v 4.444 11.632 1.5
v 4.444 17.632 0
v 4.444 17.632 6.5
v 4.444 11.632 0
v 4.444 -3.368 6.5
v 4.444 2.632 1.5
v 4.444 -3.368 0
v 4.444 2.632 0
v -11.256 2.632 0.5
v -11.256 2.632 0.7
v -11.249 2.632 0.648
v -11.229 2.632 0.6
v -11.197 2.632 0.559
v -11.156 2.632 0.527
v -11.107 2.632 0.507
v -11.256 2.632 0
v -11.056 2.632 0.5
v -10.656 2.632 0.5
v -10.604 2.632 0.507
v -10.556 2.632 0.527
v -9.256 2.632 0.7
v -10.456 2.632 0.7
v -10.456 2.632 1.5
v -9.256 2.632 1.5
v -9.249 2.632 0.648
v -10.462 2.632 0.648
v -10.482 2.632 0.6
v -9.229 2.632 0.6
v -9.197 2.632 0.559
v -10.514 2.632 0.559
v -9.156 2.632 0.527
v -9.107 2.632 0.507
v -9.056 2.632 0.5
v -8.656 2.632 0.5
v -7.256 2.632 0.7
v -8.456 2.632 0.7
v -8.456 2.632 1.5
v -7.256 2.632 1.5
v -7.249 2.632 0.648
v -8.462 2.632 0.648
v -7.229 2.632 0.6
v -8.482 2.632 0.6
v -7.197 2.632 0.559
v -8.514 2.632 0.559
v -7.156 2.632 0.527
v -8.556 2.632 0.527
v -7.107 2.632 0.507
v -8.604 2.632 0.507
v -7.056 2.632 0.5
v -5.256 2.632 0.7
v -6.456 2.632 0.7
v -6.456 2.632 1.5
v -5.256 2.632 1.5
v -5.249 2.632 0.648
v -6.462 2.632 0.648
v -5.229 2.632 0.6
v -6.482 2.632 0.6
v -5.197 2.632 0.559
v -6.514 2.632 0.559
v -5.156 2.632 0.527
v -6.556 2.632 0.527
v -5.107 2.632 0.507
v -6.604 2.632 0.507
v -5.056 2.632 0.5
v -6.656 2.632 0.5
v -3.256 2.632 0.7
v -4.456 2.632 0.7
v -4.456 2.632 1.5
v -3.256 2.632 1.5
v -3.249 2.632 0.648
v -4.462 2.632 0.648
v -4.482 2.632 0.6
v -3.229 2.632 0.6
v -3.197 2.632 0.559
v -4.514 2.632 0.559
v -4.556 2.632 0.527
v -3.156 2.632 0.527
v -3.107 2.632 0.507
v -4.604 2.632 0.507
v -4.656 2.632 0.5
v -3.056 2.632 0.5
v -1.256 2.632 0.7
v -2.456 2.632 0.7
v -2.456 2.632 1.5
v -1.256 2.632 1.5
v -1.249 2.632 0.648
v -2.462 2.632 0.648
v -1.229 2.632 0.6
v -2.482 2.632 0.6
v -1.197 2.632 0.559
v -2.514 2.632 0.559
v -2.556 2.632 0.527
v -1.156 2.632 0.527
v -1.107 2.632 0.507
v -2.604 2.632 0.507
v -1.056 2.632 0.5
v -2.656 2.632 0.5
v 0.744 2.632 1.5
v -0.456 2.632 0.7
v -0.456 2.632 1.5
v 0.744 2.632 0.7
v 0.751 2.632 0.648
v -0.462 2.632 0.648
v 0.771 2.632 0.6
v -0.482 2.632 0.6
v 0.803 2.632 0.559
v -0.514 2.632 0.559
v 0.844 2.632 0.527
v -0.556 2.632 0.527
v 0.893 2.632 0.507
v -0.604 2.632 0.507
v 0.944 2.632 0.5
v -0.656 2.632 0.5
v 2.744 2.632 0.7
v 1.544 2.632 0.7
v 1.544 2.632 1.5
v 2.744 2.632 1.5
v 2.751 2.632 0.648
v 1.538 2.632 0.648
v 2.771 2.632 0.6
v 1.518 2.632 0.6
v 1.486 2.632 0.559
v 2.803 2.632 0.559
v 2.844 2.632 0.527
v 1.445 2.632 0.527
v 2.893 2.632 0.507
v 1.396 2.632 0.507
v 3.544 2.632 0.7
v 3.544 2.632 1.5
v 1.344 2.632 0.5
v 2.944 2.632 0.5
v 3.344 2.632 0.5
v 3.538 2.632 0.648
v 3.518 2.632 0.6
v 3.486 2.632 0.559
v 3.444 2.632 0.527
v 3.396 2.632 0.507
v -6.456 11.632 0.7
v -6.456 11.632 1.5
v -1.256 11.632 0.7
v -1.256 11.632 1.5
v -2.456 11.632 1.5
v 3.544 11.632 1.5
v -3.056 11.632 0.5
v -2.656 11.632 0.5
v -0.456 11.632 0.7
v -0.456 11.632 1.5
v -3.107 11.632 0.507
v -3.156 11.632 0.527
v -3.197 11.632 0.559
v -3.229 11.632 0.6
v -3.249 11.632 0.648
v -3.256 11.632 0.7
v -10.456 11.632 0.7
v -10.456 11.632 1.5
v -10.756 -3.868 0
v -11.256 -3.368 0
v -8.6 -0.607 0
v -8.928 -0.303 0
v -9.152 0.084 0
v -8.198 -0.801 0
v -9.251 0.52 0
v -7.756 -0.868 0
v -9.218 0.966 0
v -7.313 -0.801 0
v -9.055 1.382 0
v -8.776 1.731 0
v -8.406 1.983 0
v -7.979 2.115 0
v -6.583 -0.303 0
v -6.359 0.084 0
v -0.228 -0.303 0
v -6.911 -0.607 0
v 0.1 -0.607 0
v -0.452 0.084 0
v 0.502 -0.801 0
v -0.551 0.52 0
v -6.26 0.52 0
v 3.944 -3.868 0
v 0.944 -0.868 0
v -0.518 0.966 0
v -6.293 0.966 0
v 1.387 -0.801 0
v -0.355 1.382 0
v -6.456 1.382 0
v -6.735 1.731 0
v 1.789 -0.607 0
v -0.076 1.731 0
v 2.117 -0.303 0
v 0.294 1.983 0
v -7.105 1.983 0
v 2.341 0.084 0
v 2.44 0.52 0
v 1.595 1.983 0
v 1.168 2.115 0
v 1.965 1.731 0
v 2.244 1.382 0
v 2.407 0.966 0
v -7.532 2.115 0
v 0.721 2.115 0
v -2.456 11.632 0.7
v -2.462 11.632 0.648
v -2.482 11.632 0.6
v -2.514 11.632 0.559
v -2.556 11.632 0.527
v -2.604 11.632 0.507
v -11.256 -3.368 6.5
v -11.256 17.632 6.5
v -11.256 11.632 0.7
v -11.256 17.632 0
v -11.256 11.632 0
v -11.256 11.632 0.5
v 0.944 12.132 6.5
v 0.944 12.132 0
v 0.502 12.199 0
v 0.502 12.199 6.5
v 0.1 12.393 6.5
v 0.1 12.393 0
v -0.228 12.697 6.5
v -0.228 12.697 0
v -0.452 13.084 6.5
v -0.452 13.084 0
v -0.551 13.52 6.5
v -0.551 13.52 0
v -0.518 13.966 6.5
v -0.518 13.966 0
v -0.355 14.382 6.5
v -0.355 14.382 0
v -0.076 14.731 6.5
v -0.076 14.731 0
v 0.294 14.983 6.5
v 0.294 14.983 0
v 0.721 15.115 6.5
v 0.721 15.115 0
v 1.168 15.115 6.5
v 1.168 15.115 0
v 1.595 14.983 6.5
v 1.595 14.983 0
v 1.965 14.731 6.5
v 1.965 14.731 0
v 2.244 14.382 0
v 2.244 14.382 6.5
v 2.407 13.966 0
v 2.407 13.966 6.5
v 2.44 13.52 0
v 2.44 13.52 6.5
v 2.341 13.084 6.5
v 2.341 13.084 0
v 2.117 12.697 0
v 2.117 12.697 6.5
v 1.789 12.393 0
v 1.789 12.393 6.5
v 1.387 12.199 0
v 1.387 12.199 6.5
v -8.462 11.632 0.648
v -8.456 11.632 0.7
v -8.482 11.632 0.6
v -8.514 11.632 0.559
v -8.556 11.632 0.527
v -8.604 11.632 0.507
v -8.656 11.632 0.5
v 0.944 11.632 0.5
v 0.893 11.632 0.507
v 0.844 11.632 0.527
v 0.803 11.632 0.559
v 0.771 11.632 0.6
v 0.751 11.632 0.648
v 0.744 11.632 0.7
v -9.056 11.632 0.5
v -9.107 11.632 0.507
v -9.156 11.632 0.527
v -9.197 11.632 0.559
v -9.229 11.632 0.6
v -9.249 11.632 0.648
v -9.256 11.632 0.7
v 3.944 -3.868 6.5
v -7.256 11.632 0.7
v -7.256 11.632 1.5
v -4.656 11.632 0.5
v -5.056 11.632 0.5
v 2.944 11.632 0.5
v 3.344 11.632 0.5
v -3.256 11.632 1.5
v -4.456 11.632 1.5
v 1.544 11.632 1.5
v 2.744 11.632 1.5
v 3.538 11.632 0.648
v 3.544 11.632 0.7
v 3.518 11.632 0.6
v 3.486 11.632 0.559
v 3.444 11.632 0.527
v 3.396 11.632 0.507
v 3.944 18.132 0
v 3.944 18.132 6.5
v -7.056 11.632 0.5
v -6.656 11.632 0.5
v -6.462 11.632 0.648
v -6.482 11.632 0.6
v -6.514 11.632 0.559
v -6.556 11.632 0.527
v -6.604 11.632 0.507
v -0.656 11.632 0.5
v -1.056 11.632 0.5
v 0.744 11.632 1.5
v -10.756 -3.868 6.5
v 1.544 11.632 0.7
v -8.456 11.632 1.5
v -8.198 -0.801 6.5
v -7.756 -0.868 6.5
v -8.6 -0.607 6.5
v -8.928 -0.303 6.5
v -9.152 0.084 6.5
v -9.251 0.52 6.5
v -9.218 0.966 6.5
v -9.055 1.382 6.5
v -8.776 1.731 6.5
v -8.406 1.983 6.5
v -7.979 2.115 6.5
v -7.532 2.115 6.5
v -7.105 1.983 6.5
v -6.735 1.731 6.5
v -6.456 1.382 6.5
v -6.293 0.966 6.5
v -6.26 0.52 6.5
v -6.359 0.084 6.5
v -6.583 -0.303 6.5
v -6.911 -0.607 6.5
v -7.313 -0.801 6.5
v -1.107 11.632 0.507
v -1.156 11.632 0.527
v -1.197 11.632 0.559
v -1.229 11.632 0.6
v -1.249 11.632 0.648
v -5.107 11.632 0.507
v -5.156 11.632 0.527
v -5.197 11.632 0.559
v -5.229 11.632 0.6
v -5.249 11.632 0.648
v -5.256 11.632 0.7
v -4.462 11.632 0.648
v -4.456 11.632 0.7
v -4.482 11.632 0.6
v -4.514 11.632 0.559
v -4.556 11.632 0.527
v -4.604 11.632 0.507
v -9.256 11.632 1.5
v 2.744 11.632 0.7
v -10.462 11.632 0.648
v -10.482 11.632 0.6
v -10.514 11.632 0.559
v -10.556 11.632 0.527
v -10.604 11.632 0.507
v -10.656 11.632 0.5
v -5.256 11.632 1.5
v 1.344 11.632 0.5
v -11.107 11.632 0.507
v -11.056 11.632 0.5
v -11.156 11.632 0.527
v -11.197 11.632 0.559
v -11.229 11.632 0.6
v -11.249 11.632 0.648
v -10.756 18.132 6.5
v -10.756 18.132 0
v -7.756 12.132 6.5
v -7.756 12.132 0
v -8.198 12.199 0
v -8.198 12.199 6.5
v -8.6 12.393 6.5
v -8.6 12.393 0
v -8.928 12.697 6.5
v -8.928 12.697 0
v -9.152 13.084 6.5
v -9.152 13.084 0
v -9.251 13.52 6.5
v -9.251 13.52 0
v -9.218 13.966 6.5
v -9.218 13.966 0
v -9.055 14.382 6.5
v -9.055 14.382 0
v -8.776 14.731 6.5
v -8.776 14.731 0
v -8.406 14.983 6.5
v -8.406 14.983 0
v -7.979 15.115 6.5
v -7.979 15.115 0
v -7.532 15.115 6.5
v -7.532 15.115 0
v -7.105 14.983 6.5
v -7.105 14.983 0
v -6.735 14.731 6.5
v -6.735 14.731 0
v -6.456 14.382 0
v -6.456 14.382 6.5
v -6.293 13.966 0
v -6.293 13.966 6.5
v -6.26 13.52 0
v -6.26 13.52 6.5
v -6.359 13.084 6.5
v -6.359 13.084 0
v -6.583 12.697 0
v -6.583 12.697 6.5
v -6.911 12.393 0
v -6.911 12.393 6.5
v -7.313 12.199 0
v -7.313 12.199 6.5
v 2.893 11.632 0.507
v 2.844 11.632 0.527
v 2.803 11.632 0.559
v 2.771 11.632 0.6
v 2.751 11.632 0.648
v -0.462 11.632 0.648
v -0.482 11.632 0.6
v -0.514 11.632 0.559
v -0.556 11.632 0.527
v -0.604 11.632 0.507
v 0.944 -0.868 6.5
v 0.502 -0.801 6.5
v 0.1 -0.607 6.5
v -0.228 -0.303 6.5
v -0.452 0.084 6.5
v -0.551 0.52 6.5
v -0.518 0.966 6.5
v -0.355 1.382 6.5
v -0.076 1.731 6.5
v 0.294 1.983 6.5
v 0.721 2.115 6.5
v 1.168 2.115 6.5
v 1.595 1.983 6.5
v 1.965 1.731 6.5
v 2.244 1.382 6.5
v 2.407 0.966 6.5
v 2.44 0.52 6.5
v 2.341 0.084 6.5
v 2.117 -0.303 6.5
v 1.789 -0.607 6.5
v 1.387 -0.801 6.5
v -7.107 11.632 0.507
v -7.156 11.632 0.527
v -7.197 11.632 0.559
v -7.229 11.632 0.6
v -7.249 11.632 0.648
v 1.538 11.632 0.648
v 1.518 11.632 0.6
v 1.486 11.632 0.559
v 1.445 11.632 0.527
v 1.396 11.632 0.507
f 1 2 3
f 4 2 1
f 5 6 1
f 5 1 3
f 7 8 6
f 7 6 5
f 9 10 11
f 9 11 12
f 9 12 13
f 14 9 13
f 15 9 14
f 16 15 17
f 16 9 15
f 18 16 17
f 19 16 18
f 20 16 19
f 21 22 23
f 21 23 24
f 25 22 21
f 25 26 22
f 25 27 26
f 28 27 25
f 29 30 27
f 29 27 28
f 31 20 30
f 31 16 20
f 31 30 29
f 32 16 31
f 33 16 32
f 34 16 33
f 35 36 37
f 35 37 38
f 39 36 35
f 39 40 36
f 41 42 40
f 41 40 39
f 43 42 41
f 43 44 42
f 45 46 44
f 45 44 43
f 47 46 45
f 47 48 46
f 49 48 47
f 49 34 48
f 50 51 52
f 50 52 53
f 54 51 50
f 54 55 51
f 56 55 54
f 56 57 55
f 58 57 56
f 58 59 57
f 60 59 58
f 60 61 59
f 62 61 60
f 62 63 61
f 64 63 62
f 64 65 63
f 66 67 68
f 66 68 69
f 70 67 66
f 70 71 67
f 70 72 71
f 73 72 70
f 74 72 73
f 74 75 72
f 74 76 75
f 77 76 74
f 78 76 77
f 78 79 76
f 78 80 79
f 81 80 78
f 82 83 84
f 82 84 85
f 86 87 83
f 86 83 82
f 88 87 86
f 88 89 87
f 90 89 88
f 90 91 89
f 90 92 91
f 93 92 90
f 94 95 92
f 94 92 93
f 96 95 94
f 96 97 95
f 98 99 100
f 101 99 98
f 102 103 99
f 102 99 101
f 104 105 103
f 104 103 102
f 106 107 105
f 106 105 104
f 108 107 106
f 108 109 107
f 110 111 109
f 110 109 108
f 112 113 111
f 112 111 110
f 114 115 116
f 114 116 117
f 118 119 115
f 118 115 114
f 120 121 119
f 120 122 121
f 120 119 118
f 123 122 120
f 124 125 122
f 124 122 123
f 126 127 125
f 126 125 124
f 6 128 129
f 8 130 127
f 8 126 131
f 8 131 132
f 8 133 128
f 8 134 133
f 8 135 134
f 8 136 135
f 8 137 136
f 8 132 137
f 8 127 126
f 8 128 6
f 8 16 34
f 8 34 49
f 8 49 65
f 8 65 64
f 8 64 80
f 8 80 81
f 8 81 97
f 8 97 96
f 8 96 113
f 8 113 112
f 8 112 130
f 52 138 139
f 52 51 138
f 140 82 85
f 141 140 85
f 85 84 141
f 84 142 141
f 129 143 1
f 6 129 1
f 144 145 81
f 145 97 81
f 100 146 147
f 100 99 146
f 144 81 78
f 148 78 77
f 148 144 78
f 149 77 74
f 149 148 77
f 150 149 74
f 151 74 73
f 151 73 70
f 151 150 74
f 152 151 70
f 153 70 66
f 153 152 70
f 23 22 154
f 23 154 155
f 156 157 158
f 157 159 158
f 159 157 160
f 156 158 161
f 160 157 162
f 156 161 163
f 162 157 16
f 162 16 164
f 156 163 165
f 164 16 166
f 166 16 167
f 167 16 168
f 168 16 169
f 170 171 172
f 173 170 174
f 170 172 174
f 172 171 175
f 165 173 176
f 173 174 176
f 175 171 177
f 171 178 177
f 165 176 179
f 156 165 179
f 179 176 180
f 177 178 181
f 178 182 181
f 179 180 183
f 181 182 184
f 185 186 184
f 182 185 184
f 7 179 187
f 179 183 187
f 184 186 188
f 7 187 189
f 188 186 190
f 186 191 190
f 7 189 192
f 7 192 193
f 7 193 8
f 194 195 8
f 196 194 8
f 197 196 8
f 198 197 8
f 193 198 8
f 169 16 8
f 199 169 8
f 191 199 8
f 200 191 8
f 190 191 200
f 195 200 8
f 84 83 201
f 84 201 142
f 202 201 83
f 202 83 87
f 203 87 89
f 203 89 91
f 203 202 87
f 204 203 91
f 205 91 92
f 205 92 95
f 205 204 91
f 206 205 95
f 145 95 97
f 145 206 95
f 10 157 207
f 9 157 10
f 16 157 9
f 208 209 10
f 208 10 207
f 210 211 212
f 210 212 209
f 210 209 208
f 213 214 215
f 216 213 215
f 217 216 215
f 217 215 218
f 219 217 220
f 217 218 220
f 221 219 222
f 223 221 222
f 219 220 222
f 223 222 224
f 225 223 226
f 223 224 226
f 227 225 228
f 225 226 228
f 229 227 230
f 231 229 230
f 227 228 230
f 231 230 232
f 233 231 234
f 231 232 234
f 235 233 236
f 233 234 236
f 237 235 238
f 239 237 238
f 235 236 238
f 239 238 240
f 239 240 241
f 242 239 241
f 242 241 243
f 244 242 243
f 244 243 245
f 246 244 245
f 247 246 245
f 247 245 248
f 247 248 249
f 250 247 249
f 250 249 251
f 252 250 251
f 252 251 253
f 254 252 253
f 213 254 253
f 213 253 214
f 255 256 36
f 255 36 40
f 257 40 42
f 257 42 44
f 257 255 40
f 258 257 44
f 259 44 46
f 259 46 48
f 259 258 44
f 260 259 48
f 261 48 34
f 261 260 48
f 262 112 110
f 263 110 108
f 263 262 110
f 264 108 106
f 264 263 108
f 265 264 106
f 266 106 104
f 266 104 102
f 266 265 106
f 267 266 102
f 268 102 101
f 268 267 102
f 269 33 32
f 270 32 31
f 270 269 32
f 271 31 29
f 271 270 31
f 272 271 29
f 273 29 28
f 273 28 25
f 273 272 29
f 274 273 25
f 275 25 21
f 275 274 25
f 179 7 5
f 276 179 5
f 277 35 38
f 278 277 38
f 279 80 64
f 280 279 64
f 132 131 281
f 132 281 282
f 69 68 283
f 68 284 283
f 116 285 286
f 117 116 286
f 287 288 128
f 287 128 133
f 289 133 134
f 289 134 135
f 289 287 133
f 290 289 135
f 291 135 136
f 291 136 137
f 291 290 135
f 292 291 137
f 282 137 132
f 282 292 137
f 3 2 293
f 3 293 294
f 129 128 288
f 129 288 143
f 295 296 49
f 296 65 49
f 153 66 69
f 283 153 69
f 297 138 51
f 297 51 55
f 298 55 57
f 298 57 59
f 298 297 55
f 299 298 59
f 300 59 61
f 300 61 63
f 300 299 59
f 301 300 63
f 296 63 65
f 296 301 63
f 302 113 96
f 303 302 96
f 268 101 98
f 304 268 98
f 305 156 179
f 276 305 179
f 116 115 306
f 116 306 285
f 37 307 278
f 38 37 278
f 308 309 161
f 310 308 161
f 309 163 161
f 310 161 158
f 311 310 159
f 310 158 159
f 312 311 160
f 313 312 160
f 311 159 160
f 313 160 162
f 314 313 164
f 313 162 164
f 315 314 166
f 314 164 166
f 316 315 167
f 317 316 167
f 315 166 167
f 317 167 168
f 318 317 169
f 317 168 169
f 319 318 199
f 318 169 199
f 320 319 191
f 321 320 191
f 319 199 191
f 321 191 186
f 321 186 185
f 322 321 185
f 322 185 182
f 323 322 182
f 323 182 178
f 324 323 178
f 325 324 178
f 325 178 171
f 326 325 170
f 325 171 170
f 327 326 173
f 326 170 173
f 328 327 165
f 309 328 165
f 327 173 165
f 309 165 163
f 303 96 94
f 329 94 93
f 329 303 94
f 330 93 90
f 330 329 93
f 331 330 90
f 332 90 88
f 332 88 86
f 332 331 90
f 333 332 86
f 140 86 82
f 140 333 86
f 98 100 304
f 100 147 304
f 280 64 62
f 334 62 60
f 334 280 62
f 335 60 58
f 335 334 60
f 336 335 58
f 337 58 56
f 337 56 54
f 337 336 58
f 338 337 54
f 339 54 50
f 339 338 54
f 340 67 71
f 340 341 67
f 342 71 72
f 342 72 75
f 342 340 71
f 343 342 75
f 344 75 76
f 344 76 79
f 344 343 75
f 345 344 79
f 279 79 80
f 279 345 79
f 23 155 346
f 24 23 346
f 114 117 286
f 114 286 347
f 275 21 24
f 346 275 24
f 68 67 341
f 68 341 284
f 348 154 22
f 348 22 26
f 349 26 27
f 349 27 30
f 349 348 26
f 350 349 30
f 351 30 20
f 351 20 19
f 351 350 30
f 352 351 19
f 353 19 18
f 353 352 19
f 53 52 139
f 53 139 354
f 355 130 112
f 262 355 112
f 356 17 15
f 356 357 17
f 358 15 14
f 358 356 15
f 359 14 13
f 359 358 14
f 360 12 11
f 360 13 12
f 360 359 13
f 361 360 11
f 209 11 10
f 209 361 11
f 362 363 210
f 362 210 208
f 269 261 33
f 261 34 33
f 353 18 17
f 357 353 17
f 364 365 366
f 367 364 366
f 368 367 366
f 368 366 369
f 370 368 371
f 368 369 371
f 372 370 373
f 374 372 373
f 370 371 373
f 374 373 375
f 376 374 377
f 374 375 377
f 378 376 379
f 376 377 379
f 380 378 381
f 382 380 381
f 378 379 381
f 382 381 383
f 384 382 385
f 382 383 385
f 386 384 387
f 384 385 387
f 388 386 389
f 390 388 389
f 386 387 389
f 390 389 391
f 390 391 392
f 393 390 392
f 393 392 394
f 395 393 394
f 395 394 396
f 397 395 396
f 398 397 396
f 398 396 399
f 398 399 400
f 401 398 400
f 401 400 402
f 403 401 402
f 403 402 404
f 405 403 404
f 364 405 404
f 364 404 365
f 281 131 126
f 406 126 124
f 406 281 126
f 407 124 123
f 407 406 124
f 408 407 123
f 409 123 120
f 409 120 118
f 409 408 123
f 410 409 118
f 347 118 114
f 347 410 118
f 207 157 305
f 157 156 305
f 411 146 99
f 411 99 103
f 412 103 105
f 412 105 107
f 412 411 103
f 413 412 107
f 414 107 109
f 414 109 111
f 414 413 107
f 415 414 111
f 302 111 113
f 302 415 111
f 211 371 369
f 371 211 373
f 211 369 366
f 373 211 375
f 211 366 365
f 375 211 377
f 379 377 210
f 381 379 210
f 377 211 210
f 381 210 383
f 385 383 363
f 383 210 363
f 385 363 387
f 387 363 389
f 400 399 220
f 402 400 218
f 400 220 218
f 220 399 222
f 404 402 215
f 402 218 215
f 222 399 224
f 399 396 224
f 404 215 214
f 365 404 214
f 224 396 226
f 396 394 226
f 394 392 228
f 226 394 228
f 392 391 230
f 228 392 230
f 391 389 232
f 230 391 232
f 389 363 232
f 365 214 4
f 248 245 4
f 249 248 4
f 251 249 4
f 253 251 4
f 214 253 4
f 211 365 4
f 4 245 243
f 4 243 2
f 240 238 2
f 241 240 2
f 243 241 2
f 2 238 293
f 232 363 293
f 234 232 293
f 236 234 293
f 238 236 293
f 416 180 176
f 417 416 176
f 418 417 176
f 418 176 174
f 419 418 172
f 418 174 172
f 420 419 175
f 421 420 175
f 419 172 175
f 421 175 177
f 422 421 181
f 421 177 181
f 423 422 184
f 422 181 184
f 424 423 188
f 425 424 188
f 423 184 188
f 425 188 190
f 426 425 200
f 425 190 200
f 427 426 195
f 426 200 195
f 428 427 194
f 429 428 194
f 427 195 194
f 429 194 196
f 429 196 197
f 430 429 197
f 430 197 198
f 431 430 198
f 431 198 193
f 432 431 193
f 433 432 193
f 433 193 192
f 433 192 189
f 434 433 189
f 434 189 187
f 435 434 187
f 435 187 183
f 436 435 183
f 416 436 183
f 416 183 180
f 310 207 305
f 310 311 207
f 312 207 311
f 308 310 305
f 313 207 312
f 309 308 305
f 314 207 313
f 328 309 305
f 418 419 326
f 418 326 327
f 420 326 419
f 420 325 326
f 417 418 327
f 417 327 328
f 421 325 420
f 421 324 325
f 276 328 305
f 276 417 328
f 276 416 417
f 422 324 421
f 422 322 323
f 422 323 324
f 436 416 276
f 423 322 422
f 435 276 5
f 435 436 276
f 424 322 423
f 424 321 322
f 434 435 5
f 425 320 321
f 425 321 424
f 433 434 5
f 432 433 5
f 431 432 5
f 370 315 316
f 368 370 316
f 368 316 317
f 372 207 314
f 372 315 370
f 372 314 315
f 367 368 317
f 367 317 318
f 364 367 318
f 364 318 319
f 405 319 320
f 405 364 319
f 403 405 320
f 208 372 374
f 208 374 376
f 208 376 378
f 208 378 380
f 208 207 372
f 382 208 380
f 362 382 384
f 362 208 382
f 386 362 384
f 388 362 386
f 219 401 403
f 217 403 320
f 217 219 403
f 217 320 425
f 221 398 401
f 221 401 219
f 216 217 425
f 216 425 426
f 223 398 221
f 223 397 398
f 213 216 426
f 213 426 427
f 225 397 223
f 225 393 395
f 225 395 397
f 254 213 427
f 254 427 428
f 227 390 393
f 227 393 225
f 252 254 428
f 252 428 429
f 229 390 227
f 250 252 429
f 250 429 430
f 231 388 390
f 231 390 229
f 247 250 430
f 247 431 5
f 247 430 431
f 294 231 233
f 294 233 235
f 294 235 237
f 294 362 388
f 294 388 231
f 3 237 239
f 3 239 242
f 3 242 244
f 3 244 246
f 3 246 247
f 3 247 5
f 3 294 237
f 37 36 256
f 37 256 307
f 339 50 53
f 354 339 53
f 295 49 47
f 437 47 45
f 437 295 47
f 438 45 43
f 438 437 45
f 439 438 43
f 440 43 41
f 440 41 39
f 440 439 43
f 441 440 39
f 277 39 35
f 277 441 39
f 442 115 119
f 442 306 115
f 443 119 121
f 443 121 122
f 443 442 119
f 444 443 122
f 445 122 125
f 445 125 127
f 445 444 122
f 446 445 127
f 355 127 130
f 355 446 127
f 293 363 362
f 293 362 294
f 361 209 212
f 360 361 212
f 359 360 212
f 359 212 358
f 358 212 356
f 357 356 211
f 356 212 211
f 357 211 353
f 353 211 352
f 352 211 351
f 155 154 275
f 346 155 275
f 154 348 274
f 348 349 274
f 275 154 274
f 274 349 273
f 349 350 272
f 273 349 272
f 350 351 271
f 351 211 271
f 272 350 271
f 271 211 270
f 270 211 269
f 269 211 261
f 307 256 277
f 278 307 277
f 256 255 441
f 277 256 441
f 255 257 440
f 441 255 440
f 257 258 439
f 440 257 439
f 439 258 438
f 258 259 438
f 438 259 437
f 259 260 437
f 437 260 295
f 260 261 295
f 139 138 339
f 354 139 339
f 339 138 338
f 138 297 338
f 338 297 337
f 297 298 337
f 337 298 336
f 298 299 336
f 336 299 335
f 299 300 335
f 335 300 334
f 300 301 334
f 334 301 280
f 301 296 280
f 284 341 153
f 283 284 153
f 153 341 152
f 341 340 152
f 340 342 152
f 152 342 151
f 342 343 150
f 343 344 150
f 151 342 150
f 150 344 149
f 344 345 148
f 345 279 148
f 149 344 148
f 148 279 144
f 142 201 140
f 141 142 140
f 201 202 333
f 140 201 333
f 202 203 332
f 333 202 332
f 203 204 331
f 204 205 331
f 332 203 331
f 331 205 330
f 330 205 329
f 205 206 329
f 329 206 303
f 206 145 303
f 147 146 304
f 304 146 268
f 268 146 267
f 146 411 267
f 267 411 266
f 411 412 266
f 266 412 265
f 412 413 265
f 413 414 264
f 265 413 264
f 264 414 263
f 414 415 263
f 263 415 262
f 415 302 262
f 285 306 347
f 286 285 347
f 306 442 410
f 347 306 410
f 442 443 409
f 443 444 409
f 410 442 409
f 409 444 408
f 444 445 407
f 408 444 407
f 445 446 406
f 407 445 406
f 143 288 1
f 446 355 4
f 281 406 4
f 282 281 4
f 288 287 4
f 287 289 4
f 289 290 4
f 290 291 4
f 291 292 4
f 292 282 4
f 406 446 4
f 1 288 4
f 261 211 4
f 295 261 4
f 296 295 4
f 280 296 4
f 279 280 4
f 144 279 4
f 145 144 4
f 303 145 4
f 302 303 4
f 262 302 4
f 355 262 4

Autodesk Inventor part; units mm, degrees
ref_plane "YZ Plane" through (0, 0, 0) normal (1, 0, 0) x (0, 1, 0)
ref_plane "XZ Plane" through (0, 0, 0) normal (0, 1, 0) x (-1, 0, 0)
ref_plane "XY Plane" through (0, 0, 0) normal (0, 0, 1) x (1, 0, 0)
sketch "Szkic1" plane through (0, 0, 0) normal (0, 0, 1) x (1, 0, 0)
  line L0 (-11.2555, 18.1319) -> (4.4445, 18.1319)
  line L1 (4.4445, 18.1319) -> (4.4445, -3.8681)
  line L2 (4.4445, -3.8681) -> (-11.2555, -3.8681)
  line L3 (-11.2555, -3.8681) -> (-11.2555, 18.1319)
  line L4 (-11.2555, 2.6319) -> (4.4445, 2.6319)
  line L5 (-11.2555, 11.6319) -> (4.4445, 11.6319)
  point P0 (0, 0)
  dimension "d0" = 15.7
  dimension "d1" = 22
  dimension "d2" = 9
  dimension "d3" = 6.5
  dimension "d4" = 6.5
extrude "Wyciągnięcie proste1" add sketch "Szkic1" along normal blind 1.5 contours L0 L1 L5 L3 | L4 L1 L2 L3
sketch "Szkic2" plane through (0, 0, 1.5) normal (0, 0, 1) x (1, 0, 0)
  line L0 (-11.2555, 18.1319) -> (-11.2555, 11.6319) projected
  line L1 (-11.2555, 18.1319) -> (-11.2555, 11.6319) projected
  line L2 (-11.2555, 11.6319) -> (4.4445, 11.6319) projected
  line L3 (4.4445, 11.6319) -> (4.4445, 18.1319) projected
  line L4 (4.4445, 18.1319) -> (-11.2555, 18.1319) projected
  line L5 (4.4445, -3.8681) -> (4.4445, 2.6319) projected
  line L6 (4.4445, 2.6319) -> (-11.2555, 2.6319) projected
  line L7 (-11.2555, 2.6319) -> (-11.2555, -3.8681) projected
  line L8 (-11.2555, -3.8681) -> (4.4445, -3.8681) projected
  line L9 (4.4445, 18.1319) -> (-11.2555, 18.1319) projected
  line L10 (-11.2555, 18.1319) -> (4.4445, 18.1319)
  line L11 (4.4445, 18.1319) -> (4.4445, -3.8681)
  line L12 (4.4445, -3.8681) -> (-11.2555, -3.8681)
  line L13 (-11.2555, -3.8681) -> (-11.2555, 18.1319)
  point P0 (0, 0)
extrude "Wyciągnięcie proste2" add sketch "Szkic2" along normal blind 5
sketch "Szkic3" plane through (0, 0, 6.5) normal (0, 0, 1) x (1, 0, 0)
  line L0 (-11.2555, 11.6319) -> (4.4445, 11.6319) projected
  line L1 (4.4445, 2.6319) -> (-11.2555, 2.6319) projected
  line L2 (-11.2555, 18.1319) -> (-11.2555, -3.8681) projected
  line L3 (-11.2555, -3.8681) -> (4.4445, -3.8681) projected
  line L4 (4.4445, -3.8681) -> (4.4445, 18.1319) projected
  line L5 (4.4445, 18.1319) -> (-11.2555, 18.1319) projected
  point P0 (0, 0)
  point P1 (-7.7555, 13.6319)
  point P2 (0.9445, 13.6319)
  point P3 (-7.7555, 0.6319)
  point P4 (0.9445, 0.6319)
  dimension "d9" = 2
  dimension "d10" = 2
  dimension "d11" = 2
  dimension "d12" = 2
  dimension "d13" = 15.7
  dimension "d14" = 3.5
  dimension "d15" = 3.5
  dimension "d16" = 3.5
  dimension "d17" = 3.5
hole "Otwór1" at (-7.7555, 13.6319, 6.5) at (0.9445, 13.6319, 6.5) at (-7.7555, 0.6319, 6.5) at (0.9445, 0.6319, 6.5) direction (0, 0, -1) diameter 3 end through all
sketch "Szkic5" plane through (-11.2555, 2.6319, 0) normal (0, 1, 0) x (1, 0, 0)
  line L0 (0, 0) -> (15.7, 0) projected
  line L1 (15.7, 0) -> (15.7, -6.5) projected
  line L2 (0, -6.5) -> (15.7, -6.5) projected
  line L3 (0, 0) -> (0, -6.5) projected
  line L4 (12.8, -0.5) -> (12, -0.5)
  line L5 (12, -0.5) -> (12, -1.5)
  line L6 (10.8, -0.5) -> (10.8, -1.5)
  line L7 (10.8, -0.5) -> (10, -0.5)
  line L8 (10, -0.5) -> (10, -1.5)
  line L9 (8.8, -0.5) -> (8.8, -1.5)
  line L10 (8.8, -0.5) -> (8, -0.5)
  line L11 (8, -0.5) -> (8, -1.5)
  line L12 (6.8, -0.5) -> (6.8, -1.5)
  line L13 (6.8, -0.5) -> (6, -0.5)
  line L14 (6, -0.5) -> (6, -1.5)
  line L15 (4.8, -0.5) -> (4.8, -1.5)
  line L16 (4.8, -0.5) -> (4, -0.5)
  line L17 (4, -0.5) -> (4, -1.5)
  line L18 (2.8, -0.5) -> (2.8, -1.5)
  line L19 (2.8, -0.5) -> (2, -0.5)
  line L20 (2, -0.5) -> (2, -1.5)
  line L21 (0.8, -0.5) -> (0.8, -1.5)
  line L22 (0.8, -0.5) -> (0, -0.5)
  line L23 (12.8, -0.5) -> (12.8, -1.5)
  line L24 (14, -1.5) -> (14, -0.5)
  line L25 (14, -0.5) -> (14.8, -0.5)
  line L26 (14.8, -0.5) -> (14.8, -1.5)
  line L27 (0, -1.5) -> (0.8, -1.5)
  line L28 (2, -1.5) -> (2.8, -1.5)
  line L29 (4, -1.5) -> (4.8, -1.5)
  line L30 (6, -1.5) -> (6.8, -1.5)
  line L31 (8, -1.5) -> (8.8, -1.5)
  line L32 (10, -1.5) -> (10.8, -1.5)
  line L33 (12, -1.5) -> (12.8, -1.5)
  line L34 (14, -1.5) -> (14.8, -1.5)
  line L35 (0, -1.5) -> (0, -0.5)
  line L36 (0, 0) -> (0, -6.5) projected
  point P0 (11.2555, 0)
  dimension "d27" = 0.8
  dimension "d28" = 1.2
  dimension "d41" = 1
  dimension "d42" = 0.5
  dimension "d43" = 0.5
  dimension "d44" = 0.5
  dimension "d45" = 0.5
  dimension "d46" = 0.5
  dimension "d47" = 0.5
  dimension "d48" = 0.5
  dimension "d49" = 0.5
  dimension "d50" = 1
extrude "Wyciągnięcie proste3" add sketch "Szkic5" along normal blind 9 contours L22 L21 L27 L3 | L23 L33 L5 L4 | L6 L32 L8 L7 | L9 L31 L11 L10 | L12 L30 L14 L13 | L15 L29 L17 L16 | L18 L28 L20 L19 | L24 L25 L26 L34
fillet "Zaokrąglenie1" radius 0.2 16 edges at (-9.2555, 7.1319, 0.5) (-8.4555, 7.1319, 0.5) (-7.2555, 7.1319, 0.5) (-6.4555, 7.1319, 0.5) (-5.2555, 7.1319, 0.5) (-4.4555, 7.1319, 0.5) (-3.2555, 7.1319, 0.5) (-2.4555, 7.1319, 0.5) (-1.2555, 7.1319, 0.5) (-0.4555, 7.1319, 0.5) (0.7445, 7.1319, 0.5) (1.5445, 7.1319, 0.5) (2.7445, 7.1319, 0.5) (3.5445, 7.1319, 0.5) (-10.4555, 7.1319, 0.5) (-11.2555, 7.1319, 0.5)
chamfer "Faza1" distance 0.5 angle 45 4 edges at (-11.2555, -3.8681, 3.25) (4.4445, -3.8681, 3.25) (-11.2555, 18.1319, 3.25) (4.4445, 18.1319, 3.25)
equation "\"d10\" = d9"
equation "\"d11\" = d9"
equation "\"d12\" = d9"
equation "\"d15\" = d14"
equation "\"d16\" = d14"
equation "\"d17\" = d14"
equation "\"d43\" = d42"
equation "\"d44\" = d42"
equation "\"d45\" = d42"
equation "\"d46\" = d42"
equation "\"d47\" = d42"
equation "\"d48\" = d42"
equation "\"d49\" = d42"
properties part number "3DP_ABS_X_Axis_Timing_Belt_Clamp"
